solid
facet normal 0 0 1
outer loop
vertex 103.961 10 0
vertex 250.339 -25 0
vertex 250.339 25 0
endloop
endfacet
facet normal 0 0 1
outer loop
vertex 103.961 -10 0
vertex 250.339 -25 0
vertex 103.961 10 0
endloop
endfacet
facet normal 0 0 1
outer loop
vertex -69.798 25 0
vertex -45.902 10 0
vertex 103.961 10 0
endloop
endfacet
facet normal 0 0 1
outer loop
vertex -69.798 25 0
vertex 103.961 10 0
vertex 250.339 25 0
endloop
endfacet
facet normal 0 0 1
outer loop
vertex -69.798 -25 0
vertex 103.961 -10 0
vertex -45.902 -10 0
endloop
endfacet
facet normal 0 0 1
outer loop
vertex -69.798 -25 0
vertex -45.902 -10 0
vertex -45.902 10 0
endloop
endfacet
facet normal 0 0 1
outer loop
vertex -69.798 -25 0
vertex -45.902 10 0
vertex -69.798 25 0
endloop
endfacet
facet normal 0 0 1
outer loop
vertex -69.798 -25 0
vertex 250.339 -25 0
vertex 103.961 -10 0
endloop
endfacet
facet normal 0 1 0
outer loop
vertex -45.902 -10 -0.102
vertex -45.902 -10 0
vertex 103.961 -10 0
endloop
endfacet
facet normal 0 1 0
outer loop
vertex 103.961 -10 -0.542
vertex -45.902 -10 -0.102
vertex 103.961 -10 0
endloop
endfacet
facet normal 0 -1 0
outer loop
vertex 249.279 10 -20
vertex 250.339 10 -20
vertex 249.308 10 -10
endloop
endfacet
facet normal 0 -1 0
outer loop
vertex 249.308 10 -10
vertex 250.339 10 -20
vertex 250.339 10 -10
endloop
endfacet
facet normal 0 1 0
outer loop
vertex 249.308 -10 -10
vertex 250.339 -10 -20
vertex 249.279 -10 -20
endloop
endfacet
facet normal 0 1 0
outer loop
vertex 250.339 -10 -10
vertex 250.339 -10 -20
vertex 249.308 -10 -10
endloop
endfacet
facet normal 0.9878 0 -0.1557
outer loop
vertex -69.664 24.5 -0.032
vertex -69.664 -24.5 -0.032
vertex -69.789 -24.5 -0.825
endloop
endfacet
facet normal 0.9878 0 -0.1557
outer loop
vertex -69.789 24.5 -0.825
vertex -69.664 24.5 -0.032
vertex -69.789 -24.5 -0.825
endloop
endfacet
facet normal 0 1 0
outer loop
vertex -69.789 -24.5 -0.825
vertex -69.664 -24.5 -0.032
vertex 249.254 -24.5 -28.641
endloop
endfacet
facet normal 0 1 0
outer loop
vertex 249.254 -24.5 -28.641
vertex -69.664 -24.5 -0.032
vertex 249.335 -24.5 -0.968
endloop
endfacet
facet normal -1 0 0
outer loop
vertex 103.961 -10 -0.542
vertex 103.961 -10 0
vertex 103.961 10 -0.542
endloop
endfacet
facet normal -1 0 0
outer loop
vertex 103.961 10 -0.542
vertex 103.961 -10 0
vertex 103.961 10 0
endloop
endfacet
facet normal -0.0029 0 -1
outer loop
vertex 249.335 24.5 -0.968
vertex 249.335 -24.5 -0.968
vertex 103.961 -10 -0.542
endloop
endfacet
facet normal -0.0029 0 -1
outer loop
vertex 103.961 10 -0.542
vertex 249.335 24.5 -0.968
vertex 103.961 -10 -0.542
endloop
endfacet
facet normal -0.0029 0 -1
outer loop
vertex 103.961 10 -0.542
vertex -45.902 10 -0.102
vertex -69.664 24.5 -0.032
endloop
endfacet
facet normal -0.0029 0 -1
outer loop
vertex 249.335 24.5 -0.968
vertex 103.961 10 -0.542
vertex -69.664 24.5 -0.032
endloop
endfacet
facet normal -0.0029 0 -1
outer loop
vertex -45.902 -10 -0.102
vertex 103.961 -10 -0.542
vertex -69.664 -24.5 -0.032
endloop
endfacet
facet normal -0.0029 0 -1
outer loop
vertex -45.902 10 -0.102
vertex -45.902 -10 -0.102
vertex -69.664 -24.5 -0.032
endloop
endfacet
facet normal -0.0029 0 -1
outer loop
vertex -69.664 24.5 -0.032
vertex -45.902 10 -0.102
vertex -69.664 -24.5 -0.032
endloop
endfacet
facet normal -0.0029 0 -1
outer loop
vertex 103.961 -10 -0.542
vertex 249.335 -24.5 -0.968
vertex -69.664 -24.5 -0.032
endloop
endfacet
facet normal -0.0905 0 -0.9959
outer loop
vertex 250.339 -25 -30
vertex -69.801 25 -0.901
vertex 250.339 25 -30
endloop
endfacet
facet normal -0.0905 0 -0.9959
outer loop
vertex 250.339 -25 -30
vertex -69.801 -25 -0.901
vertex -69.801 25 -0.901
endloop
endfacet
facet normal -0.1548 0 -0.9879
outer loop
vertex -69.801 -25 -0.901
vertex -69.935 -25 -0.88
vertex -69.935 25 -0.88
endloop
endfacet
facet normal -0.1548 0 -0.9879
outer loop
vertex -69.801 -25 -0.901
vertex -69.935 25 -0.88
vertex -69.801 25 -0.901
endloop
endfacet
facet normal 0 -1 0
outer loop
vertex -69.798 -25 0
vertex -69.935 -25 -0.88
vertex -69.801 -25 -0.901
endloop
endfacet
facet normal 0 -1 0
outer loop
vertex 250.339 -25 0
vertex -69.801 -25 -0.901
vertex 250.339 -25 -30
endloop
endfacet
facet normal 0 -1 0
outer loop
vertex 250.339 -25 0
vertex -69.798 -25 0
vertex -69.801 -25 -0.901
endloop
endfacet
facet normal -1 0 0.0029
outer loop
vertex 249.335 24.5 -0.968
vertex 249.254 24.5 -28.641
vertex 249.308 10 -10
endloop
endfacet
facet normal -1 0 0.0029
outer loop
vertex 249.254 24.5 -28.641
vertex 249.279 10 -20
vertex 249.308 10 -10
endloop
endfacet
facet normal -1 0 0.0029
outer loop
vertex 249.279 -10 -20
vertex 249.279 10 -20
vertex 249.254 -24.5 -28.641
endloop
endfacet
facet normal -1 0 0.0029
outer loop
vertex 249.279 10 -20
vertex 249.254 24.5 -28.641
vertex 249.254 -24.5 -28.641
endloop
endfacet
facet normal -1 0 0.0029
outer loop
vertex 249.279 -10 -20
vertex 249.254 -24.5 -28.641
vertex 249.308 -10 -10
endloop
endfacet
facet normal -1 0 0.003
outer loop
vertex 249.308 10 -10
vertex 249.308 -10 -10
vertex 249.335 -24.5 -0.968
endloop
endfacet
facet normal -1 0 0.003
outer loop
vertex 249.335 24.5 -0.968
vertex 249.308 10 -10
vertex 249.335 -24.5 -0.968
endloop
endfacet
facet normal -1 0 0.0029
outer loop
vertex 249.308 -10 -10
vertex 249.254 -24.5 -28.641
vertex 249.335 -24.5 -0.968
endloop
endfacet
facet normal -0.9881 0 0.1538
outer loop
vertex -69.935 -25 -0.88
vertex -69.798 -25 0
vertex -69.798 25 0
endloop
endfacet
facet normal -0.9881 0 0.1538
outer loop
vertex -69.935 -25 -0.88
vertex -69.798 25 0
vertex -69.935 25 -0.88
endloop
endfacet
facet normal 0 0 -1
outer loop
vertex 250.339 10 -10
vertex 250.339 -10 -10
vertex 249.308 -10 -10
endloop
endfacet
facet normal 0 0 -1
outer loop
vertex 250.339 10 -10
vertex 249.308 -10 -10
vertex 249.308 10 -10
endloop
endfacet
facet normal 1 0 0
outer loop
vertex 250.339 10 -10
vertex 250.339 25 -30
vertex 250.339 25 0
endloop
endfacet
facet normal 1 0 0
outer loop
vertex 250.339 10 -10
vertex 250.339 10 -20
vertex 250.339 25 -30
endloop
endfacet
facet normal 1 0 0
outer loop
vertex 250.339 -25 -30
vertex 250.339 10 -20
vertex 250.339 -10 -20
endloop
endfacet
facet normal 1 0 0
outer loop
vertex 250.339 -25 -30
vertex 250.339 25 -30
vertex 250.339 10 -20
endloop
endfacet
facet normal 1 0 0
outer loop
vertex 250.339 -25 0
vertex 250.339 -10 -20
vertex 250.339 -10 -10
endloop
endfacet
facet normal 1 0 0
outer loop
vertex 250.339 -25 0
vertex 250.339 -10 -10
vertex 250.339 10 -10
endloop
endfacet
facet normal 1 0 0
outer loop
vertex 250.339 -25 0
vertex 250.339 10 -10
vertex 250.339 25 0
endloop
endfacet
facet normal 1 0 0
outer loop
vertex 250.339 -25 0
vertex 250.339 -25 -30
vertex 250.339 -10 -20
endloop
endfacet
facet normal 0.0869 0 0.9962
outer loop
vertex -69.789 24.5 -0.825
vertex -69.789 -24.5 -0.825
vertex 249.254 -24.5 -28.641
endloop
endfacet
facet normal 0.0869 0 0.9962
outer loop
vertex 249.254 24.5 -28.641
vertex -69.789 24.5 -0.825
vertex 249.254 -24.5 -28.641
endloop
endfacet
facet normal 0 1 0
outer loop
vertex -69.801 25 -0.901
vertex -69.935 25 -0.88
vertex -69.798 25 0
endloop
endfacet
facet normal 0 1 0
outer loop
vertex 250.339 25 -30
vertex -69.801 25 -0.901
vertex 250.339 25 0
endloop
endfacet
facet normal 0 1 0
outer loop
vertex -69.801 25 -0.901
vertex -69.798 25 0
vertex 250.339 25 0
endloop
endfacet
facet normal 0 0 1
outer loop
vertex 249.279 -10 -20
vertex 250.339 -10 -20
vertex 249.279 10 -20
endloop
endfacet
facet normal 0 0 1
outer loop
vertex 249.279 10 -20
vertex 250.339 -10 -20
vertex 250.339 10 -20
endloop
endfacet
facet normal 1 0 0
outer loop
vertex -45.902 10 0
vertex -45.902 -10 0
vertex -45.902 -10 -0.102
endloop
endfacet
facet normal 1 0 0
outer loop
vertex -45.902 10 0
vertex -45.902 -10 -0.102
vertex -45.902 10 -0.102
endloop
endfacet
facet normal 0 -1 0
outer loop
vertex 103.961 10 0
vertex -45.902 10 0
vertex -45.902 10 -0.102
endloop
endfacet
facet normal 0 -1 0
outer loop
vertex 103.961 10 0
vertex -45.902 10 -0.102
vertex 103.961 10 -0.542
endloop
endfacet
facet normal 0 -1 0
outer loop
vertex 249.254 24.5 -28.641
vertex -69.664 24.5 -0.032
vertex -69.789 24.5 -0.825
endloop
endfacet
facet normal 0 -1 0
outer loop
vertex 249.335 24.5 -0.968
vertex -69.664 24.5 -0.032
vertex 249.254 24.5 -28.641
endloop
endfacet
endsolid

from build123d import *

# Parameters (mm, degrees)
F1_DEPTH = 25
F2_DEPTH = 24.5
F3_W     = 20
F3_H     = 10
F4_DEPTH = 1.061394367
F5_W     = 149.8626496709
F5_H     = 20
F6_DEPTH = 0.5426750459


# Not quite as in the source:
# - a feature names something its author has since deleted; it is built from what else it names


with BuildPart() as f1:
    # F0 (on Front) → F1 (new body, symmetric)
    with BuildSketch(Plane.XZ):
        Polygon((250.3392749669, 0), (-69.6607250331, 0), (-69.7979346905, 0), (-69.9352178344, -0.8798027663), (-69.8012695535, -0.9007038612), (250.3392749669, -30), align=None)
        Polygon((-69.7894617915, -0.8250317769), (-69.6638822556, -0.0320404142), (249.3347435311, -0.9683876885), (249.2535173062, -28.6408707924), align=None, mode=Mode.SUBTRACT)
        Polygon((249.3347435311, -0.9683876885), (-69.6638822556, -0.0320404142), (-69.7894617915, -0.8250317769), (249.2535173062, -28.6408707924), align=None)
    extrude(amount=F1_DEPTH, both=True)

    # F0 (on Front) → F2 (cut, symmetric)
    with BuildSketch(Plane.XZ):
        Polygon((249.3347435311, -0.9683876885), (-69.6638822556, -0.0320404142), (-69.7894617915, -0.8250317769), (249.2535173062, -28.6408707924), align=None)
    extrude(amount=F2_DEPTH, both=True, mode=Mode.SUBTRACT)

    # F3 (on face) → F4 (cut, through all)
    with BuildSketch(Plane.YZ.offset(250.3392749669)):
        with Locations((0, -15)):
            Rectangle(F3_W, F3_H)
    extrude(amount=-F4_DEPTH, mode=Mode.SUBTRACT)

    # F5 (on face) → F6 (cut, through all)
    with BuildSketch(Plane.XY):
        with Locations((29.0292073041, 0)):
            Rectangle(F5_W, F5_H)
    extrude(amount=-F6_DEPTH, mode=Mode.SUBTRACT)


solid = f1.part
